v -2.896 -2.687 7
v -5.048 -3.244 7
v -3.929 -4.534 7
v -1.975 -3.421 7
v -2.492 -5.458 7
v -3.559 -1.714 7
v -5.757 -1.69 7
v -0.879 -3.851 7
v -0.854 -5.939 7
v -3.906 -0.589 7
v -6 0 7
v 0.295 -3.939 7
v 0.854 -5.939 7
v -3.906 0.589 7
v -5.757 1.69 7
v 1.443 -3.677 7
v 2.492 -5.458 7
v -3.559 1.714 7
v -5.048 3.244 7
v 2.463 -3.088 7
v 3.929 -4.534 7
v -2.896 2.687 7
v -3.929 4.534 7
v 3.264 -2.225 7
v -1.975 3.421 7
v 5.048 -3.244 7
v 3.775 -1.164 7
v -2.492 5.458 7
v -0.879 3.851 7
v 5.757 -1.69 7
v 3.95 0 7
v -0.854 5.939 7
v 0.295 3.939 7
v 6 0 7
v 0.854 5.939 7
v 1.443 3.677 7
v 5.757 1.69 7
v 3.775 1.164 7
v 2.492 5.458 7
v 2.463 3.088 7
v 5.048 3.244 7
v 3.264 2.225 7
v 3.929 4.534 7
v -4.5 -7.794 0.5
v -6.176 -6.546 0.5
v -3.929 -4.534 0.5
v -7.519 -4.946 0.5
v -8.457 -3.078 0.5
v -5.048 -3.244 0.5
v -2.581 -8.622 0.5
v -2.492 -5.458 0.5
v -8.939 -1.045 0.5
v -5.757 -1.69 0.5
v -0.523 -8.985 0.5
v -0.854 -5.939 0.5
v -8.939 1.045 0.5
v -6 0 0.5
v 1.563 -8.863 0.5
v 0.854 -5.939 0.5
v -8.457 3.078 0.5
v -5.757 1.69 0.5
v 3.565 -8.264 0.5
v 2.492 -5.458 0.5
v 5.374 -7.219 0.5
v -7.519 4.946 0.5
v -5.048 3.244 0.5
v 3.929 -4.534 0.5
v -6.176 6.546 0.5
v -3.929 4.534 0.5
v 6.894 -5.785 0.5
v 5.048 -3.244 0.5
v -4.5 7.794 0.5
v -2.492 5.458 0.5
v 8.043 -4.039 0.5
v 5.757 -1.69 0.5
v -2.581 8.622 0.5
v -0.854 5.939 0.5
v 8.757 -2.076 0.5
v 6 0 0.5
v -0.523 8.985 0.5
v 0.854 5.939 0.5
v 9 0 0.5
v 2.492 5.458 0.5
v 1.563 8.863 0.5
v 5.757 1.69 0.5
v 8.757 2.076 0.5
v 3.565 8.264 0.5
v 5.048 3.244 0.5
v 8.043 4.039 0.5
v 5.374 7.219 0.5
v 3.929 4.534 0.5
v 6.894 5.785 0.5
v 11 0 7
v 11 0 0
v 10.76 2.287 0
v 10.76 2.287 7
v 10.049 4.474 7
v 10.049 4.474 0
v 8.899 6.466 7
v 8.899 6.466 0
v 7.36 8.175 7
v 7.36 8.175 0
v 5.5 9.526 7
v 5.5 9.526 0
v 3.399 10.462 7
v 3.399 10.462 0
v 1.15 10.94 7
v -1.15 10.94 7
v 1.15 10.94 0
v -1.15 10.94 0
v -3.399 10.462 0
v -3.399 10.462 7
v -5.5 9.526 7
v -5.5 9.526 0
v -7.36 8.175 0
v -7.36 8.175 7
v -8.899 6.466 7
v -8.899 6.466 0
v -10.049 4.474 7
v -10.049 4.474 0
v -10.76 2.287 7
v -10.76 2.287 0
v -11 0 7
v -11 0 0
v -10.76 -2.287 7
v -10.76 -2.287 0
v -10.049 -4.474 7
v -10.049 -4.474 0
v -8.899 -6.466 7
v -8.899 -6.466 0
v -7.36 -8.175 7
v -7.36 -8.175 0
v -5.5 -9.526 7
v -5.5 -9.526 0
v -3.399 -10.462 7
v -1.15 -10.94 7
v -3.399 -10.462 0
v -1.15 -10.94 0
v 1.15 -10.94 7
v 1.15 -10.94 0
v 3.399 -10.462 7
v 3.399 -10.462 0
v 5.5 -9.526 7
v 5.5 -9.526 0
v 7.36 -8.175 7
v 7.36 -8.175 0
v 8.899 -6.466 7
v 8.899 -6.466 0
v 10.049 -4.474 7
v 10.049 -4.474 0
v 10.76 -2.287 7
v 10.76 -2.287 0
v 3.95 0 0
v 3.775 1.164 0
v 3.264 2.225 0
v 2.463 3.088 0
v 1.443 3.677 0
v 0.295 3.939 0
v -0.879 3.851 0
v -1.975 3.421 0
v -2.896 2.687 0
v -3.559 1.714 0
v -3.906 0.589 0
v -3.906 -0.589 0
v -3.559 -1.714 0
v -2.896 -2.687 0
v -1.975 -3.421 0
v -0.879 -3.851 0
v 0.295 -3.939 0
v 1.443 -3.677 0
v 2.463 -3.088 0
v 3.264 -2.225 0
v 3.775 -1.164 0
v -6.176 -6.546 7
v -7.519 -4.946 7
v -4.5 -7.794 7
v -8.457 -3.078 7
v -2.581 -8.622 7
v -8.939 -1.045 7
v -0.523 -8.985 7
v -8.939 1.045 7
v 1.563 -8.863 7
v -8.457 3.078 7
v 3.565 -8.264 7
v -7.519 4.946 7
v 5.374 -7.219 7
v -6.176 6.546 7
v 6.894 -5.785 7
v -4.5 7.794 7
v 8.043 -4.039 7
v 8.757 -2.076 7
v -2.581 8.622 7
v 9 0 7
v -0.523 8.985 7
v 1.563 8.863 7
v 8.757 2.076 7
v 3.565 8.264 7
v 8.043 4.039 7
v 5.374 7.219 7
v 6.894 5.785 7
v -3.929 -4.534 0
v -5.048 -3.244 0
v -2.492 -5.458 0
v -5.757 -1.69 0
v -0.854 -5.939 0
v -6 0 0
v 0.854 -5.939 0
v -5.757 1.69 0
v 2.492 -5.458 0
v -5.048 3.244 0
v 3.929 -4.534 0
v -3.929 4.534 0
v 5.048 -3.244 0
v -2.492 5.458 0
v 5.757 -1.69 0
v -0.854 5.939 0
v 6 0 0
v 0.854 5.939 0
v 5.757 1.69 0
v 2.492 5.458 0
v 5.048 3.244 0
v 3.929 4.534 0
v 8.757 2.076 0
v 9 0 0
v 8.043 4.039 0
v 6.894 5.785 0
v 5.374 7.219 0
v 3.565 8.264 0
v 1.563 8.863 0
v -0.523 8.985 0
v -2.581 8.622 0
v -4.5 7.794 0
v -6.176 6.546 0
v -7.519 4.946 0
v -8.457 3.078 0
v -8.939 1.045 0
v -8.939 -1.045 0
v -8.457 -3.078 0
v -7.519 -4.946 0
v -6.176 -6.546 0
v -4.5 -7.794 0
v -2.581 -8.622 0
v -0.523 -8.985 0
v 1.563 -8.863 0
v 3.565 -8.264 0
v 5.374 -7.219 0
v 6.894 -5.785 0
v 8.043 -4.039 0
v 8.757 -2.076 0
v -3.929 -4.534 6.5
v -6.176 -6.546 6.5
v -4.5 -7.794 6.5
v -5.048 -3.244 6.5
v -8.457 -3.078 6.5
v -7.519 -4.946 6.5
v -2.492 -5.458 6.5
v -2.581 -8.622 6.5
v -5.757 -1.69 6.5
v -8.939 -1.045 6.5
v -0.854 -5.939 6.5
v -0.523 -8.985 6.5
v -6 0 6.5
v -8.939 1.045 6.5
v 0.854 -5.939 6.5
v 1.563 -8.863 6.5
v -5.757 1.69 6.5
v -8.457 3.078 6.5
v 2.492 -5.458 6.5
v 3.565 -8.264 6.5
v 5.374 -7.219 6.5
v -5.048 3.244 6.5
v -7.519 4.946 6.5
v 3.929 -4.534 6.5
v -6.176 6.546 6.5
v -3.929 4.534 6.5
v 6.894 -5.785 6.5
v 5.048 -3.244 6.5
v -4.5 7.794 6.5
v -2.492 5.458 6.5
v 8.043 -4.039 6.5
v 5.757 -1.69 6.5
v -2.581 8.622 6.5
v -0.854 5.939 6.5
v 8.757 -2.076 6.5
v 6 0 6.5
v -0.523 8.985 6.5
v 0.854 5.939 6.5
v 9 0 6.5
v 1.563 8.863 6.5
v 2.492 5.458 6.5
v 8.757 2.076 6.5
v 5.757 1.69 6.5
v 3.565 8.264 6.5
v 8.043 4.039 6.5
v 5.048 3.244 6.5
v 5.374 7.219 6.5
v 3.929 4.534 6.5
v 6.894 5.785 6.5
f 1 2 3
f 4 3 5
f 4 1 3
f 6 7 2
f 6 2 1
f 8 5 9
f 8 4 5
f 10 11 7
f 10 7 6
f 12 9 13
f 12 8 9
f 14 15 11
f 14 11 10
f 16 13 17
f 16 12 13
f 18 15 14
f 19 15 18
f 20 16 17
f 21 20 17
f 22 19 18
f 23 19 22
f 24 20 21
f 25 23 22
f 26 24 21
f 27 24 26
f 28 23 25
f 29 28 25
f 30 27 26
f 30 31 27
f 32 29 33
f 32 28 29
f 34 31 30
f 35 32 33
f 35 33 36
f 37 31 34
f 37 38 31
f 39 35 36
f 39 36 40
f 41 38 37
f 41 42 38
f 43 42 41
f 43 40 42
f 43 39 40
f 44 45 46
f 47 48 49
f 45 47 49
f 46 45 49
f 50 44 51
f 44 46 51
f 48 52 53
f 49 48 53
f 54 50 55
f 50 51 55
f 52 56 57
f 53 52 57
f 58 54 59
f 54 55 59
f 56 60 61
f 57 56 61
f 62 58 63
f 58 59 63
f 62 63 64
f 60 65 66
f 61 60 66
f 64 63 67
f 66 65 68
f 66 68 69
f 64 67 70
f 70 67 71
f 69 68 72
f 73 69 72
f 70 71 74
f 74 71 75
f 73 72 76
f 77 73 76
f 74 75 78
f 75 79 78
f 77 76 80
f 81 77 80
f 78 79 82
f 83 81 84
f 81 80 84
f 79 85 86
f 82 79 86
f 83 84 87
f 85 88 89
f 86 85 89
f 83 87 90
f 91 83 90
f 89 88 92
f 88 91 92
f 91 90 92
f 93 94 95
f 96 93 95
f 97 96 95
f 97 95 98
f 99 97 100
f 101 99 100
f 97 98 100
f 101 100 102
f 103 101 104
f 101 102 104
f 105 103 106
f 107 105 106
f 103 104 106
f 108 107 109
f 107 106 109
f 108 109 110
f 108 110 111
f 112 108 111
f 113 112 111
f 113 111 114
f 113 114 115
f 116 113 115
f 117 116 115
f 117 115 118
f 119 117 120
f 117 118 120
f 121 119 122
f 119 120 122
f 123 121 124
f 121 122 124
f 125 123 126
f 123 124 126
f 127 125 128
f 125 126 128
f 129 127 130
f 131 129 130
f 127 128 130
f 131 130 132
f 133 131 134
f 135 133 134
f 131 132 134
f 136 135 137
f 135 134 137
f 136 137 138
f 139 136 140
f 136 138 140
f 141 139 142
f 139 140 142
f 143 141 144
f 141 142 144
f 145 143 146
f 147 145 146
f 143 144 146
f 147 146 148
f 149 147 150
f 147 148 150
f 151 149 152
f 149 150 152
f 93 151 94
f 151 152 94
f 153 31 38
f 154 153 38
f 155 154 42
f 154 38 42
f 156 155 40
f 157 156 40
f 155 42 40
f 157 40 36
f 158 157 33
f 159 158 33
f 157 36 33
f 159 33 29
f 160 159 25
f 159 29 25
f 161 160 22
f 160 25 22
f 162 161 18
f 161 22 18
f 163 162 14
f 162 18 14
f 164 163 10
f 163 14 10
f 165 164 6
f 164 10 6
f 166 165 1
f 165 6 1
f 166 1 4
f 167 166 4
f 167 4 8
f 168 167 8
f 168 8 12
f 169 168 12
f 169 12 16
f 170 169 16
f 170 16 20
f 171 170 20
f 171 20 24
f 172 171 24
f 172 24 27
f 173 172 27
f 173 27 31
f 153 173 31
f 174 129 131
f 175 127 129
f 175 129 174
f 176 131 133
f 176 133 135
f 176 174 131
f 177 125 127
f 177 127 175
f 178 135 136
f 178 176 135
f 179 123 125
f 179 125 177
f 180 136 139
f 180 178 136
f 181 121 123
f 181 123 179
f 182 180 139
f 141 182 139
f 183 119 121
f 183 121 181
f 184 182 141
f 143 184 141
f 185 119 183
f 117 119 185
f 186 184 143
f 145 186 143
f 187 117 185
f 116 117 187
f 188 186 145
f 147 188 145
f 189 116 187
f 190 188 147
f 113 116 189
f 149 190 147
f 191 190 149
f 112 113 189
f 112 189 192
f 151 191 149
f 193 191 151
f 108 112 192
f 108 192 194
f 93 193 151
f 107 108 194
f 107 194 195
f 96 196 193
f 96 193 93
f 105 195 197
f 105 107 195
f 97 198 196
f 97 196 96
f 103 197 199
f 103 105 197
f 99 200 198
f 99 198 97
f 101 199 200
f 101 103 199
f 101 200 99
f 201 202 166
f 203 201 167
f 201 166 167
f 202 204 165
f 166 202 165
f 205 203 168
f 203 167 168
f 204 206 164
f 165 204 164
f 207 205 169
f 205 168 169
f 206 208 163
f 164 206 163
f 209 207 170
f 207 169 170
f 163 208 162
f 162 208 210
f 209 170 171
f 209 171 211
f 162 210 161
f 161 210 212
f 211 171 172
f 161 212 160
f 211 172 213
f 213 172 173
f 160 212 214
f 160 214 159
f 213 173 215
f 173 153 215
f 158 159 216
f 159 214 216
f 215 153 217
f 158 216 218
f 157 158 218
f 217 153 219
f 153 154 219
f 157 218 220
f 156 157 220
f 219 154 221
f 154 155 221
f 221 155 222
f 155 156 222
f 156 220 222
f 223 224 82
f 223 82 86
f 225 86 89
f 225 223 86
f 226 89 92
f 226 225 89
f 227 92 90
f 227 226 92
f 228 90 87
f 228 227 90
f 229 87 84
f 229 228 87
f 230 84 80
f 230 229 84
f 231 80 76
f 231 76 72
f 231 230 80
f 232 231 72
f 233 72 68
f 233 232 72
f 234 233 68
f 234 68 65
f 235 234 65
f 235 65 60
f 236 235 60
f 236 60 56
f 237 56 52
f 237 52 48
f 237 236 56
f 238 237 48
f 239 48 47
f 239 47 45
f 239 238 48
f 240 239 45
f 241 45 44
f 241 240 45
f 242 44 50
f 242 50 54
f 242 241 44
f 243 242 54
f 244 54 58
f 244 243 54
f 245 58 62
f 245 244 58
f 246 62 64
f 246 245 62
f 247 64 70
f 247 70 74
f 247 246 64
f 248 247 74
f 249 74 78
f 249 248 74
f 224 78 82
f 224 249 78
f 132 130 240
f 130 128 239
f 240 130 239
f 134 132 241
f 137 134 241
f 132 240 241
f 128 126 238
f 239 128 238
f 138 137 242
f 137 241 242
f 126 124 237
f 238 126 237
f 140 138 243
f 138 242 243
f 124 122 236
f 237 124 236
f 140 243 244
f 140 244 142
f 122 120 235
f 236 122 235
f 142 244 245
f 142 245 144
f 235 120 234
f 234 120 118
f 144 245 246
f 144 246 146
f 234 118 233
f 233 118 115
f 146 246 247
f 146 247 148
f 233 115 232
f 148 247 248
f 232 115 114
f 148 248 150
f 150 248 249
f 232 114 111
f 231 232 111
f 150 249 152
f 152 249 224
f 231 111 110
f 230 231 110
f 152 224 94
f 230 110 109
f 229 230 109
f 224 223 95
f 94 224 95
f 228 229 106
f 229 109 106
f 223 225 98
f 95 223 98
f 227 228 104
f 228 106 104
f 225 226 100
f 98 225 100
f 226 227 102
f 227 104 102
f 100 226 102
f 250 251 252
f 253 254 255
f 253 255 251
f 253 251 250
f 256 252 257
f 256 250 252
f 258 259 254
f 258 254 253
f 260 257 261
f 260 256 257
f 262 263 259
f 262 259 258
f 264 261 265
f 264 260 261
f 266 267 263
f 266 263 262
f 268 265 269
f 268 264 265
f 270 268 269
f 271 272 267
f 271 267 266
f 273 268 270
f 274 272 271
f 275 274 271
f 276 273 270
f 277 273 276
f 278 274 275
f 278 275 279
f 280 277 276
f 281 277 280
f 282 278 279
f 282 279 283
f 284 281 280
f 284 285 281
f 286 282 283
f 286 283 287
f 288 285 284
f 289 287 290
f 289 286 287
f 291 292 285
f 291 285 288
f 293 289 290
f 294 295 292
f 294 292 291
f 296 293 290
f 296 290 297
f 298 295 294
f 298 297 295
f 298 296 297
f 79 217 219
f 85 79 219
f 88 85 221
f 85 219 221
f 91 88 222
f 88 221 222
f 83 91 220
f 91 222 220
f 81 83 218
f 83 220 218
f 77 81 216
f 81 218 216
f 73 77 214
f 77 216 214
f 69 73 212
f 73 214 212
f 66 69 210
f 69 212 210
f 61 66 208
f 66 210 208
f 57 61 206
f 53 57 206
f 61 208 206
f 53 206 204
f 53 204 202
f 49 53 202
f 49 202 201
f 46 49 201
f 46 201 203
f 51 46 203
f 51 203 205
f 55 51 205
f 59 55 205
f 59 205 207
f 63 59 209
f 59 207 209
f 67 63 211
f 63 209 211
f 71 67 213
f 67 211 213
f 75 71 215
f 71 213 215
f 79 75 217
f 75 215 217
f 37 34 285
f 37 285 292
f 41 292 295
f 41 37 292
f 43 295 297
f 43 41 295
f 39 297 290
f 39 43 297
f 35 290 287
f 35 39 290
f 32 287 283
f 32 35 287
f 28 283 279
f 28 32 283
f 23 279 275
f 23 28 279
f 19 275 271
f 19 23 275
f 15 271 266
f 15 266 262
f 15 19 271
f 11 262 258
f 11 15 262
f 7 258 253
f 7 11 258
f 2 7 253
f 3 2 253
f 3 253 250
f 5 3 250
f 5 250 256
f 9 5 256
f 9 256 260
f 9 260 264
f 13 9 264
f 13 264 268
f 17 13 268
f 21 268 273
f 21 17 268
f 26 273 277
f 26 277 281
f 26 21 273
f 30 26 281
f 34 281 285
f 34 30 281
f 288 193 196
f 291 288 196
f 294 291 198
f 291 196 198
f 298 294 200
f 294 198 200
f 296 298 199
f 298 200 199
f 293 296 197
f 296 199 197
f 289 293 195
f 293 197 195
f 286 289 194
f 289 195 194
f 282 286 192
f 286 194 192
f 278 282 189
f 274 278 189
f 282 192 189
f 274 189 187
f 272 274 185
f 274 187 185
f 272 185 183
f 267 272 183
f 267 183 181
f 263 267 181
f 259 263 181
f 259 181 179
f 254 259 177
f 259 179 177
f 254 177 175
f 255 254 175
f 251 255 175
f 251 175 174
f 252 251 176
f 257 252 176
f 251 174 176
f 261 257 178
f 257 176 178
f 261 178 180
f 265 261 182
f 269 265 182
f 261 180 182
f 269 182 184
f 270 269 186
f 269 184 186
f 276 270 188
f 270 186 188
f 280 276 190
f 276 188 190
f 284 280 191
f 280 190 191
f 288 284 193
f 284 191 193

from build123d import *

# Parameters (mm, degrees)
F0_R     = 11
F1_DEPTH = 7
F2_R     = 9
F2_R_2   = 6
F3_DEPTH = 0.5
F4_R     = 3.95
F5_DEPTH = 7.001
F6_R     = 9
F6_R_2   = 6
F7_DEPTH = 0.5


with BuildPart() as f1:
    # F0 (on Top) → F1 (new body)
    with BuildSketch(Plane.XY):
        Circle(F0_R)
    extrude(amount=F1_DEPTH)

    # F2 (on face) → F3 (cut)
    with BuildSketch(Plane.XY.offset(7)):
        Circle(F2_R)
        Circle(F2_R_2, mode=Mode.SUBTRACT)
    extrude(amount=-F3_DEPTH, mode=Mode.SUBTRACT)

    # F4 (on face) → F5 (cut, through all)
    with BuildSketch(Plane.XY.offset(7)):
        Circle(F4_R)
    extrude(amount=-F5_DEPTH, mode=Mode.SUBTRACT)

    # F6 (on face) → F7 (cut)
    with BuildSketch(Plane.XY):
        Circle(F6_R)
        Circle(F6_R_2, mode=Mode.SUBTRACT)
    extrude(amount=F7_DEPTH, mode=Mode.SUBTRACT)


solid = f1.part
